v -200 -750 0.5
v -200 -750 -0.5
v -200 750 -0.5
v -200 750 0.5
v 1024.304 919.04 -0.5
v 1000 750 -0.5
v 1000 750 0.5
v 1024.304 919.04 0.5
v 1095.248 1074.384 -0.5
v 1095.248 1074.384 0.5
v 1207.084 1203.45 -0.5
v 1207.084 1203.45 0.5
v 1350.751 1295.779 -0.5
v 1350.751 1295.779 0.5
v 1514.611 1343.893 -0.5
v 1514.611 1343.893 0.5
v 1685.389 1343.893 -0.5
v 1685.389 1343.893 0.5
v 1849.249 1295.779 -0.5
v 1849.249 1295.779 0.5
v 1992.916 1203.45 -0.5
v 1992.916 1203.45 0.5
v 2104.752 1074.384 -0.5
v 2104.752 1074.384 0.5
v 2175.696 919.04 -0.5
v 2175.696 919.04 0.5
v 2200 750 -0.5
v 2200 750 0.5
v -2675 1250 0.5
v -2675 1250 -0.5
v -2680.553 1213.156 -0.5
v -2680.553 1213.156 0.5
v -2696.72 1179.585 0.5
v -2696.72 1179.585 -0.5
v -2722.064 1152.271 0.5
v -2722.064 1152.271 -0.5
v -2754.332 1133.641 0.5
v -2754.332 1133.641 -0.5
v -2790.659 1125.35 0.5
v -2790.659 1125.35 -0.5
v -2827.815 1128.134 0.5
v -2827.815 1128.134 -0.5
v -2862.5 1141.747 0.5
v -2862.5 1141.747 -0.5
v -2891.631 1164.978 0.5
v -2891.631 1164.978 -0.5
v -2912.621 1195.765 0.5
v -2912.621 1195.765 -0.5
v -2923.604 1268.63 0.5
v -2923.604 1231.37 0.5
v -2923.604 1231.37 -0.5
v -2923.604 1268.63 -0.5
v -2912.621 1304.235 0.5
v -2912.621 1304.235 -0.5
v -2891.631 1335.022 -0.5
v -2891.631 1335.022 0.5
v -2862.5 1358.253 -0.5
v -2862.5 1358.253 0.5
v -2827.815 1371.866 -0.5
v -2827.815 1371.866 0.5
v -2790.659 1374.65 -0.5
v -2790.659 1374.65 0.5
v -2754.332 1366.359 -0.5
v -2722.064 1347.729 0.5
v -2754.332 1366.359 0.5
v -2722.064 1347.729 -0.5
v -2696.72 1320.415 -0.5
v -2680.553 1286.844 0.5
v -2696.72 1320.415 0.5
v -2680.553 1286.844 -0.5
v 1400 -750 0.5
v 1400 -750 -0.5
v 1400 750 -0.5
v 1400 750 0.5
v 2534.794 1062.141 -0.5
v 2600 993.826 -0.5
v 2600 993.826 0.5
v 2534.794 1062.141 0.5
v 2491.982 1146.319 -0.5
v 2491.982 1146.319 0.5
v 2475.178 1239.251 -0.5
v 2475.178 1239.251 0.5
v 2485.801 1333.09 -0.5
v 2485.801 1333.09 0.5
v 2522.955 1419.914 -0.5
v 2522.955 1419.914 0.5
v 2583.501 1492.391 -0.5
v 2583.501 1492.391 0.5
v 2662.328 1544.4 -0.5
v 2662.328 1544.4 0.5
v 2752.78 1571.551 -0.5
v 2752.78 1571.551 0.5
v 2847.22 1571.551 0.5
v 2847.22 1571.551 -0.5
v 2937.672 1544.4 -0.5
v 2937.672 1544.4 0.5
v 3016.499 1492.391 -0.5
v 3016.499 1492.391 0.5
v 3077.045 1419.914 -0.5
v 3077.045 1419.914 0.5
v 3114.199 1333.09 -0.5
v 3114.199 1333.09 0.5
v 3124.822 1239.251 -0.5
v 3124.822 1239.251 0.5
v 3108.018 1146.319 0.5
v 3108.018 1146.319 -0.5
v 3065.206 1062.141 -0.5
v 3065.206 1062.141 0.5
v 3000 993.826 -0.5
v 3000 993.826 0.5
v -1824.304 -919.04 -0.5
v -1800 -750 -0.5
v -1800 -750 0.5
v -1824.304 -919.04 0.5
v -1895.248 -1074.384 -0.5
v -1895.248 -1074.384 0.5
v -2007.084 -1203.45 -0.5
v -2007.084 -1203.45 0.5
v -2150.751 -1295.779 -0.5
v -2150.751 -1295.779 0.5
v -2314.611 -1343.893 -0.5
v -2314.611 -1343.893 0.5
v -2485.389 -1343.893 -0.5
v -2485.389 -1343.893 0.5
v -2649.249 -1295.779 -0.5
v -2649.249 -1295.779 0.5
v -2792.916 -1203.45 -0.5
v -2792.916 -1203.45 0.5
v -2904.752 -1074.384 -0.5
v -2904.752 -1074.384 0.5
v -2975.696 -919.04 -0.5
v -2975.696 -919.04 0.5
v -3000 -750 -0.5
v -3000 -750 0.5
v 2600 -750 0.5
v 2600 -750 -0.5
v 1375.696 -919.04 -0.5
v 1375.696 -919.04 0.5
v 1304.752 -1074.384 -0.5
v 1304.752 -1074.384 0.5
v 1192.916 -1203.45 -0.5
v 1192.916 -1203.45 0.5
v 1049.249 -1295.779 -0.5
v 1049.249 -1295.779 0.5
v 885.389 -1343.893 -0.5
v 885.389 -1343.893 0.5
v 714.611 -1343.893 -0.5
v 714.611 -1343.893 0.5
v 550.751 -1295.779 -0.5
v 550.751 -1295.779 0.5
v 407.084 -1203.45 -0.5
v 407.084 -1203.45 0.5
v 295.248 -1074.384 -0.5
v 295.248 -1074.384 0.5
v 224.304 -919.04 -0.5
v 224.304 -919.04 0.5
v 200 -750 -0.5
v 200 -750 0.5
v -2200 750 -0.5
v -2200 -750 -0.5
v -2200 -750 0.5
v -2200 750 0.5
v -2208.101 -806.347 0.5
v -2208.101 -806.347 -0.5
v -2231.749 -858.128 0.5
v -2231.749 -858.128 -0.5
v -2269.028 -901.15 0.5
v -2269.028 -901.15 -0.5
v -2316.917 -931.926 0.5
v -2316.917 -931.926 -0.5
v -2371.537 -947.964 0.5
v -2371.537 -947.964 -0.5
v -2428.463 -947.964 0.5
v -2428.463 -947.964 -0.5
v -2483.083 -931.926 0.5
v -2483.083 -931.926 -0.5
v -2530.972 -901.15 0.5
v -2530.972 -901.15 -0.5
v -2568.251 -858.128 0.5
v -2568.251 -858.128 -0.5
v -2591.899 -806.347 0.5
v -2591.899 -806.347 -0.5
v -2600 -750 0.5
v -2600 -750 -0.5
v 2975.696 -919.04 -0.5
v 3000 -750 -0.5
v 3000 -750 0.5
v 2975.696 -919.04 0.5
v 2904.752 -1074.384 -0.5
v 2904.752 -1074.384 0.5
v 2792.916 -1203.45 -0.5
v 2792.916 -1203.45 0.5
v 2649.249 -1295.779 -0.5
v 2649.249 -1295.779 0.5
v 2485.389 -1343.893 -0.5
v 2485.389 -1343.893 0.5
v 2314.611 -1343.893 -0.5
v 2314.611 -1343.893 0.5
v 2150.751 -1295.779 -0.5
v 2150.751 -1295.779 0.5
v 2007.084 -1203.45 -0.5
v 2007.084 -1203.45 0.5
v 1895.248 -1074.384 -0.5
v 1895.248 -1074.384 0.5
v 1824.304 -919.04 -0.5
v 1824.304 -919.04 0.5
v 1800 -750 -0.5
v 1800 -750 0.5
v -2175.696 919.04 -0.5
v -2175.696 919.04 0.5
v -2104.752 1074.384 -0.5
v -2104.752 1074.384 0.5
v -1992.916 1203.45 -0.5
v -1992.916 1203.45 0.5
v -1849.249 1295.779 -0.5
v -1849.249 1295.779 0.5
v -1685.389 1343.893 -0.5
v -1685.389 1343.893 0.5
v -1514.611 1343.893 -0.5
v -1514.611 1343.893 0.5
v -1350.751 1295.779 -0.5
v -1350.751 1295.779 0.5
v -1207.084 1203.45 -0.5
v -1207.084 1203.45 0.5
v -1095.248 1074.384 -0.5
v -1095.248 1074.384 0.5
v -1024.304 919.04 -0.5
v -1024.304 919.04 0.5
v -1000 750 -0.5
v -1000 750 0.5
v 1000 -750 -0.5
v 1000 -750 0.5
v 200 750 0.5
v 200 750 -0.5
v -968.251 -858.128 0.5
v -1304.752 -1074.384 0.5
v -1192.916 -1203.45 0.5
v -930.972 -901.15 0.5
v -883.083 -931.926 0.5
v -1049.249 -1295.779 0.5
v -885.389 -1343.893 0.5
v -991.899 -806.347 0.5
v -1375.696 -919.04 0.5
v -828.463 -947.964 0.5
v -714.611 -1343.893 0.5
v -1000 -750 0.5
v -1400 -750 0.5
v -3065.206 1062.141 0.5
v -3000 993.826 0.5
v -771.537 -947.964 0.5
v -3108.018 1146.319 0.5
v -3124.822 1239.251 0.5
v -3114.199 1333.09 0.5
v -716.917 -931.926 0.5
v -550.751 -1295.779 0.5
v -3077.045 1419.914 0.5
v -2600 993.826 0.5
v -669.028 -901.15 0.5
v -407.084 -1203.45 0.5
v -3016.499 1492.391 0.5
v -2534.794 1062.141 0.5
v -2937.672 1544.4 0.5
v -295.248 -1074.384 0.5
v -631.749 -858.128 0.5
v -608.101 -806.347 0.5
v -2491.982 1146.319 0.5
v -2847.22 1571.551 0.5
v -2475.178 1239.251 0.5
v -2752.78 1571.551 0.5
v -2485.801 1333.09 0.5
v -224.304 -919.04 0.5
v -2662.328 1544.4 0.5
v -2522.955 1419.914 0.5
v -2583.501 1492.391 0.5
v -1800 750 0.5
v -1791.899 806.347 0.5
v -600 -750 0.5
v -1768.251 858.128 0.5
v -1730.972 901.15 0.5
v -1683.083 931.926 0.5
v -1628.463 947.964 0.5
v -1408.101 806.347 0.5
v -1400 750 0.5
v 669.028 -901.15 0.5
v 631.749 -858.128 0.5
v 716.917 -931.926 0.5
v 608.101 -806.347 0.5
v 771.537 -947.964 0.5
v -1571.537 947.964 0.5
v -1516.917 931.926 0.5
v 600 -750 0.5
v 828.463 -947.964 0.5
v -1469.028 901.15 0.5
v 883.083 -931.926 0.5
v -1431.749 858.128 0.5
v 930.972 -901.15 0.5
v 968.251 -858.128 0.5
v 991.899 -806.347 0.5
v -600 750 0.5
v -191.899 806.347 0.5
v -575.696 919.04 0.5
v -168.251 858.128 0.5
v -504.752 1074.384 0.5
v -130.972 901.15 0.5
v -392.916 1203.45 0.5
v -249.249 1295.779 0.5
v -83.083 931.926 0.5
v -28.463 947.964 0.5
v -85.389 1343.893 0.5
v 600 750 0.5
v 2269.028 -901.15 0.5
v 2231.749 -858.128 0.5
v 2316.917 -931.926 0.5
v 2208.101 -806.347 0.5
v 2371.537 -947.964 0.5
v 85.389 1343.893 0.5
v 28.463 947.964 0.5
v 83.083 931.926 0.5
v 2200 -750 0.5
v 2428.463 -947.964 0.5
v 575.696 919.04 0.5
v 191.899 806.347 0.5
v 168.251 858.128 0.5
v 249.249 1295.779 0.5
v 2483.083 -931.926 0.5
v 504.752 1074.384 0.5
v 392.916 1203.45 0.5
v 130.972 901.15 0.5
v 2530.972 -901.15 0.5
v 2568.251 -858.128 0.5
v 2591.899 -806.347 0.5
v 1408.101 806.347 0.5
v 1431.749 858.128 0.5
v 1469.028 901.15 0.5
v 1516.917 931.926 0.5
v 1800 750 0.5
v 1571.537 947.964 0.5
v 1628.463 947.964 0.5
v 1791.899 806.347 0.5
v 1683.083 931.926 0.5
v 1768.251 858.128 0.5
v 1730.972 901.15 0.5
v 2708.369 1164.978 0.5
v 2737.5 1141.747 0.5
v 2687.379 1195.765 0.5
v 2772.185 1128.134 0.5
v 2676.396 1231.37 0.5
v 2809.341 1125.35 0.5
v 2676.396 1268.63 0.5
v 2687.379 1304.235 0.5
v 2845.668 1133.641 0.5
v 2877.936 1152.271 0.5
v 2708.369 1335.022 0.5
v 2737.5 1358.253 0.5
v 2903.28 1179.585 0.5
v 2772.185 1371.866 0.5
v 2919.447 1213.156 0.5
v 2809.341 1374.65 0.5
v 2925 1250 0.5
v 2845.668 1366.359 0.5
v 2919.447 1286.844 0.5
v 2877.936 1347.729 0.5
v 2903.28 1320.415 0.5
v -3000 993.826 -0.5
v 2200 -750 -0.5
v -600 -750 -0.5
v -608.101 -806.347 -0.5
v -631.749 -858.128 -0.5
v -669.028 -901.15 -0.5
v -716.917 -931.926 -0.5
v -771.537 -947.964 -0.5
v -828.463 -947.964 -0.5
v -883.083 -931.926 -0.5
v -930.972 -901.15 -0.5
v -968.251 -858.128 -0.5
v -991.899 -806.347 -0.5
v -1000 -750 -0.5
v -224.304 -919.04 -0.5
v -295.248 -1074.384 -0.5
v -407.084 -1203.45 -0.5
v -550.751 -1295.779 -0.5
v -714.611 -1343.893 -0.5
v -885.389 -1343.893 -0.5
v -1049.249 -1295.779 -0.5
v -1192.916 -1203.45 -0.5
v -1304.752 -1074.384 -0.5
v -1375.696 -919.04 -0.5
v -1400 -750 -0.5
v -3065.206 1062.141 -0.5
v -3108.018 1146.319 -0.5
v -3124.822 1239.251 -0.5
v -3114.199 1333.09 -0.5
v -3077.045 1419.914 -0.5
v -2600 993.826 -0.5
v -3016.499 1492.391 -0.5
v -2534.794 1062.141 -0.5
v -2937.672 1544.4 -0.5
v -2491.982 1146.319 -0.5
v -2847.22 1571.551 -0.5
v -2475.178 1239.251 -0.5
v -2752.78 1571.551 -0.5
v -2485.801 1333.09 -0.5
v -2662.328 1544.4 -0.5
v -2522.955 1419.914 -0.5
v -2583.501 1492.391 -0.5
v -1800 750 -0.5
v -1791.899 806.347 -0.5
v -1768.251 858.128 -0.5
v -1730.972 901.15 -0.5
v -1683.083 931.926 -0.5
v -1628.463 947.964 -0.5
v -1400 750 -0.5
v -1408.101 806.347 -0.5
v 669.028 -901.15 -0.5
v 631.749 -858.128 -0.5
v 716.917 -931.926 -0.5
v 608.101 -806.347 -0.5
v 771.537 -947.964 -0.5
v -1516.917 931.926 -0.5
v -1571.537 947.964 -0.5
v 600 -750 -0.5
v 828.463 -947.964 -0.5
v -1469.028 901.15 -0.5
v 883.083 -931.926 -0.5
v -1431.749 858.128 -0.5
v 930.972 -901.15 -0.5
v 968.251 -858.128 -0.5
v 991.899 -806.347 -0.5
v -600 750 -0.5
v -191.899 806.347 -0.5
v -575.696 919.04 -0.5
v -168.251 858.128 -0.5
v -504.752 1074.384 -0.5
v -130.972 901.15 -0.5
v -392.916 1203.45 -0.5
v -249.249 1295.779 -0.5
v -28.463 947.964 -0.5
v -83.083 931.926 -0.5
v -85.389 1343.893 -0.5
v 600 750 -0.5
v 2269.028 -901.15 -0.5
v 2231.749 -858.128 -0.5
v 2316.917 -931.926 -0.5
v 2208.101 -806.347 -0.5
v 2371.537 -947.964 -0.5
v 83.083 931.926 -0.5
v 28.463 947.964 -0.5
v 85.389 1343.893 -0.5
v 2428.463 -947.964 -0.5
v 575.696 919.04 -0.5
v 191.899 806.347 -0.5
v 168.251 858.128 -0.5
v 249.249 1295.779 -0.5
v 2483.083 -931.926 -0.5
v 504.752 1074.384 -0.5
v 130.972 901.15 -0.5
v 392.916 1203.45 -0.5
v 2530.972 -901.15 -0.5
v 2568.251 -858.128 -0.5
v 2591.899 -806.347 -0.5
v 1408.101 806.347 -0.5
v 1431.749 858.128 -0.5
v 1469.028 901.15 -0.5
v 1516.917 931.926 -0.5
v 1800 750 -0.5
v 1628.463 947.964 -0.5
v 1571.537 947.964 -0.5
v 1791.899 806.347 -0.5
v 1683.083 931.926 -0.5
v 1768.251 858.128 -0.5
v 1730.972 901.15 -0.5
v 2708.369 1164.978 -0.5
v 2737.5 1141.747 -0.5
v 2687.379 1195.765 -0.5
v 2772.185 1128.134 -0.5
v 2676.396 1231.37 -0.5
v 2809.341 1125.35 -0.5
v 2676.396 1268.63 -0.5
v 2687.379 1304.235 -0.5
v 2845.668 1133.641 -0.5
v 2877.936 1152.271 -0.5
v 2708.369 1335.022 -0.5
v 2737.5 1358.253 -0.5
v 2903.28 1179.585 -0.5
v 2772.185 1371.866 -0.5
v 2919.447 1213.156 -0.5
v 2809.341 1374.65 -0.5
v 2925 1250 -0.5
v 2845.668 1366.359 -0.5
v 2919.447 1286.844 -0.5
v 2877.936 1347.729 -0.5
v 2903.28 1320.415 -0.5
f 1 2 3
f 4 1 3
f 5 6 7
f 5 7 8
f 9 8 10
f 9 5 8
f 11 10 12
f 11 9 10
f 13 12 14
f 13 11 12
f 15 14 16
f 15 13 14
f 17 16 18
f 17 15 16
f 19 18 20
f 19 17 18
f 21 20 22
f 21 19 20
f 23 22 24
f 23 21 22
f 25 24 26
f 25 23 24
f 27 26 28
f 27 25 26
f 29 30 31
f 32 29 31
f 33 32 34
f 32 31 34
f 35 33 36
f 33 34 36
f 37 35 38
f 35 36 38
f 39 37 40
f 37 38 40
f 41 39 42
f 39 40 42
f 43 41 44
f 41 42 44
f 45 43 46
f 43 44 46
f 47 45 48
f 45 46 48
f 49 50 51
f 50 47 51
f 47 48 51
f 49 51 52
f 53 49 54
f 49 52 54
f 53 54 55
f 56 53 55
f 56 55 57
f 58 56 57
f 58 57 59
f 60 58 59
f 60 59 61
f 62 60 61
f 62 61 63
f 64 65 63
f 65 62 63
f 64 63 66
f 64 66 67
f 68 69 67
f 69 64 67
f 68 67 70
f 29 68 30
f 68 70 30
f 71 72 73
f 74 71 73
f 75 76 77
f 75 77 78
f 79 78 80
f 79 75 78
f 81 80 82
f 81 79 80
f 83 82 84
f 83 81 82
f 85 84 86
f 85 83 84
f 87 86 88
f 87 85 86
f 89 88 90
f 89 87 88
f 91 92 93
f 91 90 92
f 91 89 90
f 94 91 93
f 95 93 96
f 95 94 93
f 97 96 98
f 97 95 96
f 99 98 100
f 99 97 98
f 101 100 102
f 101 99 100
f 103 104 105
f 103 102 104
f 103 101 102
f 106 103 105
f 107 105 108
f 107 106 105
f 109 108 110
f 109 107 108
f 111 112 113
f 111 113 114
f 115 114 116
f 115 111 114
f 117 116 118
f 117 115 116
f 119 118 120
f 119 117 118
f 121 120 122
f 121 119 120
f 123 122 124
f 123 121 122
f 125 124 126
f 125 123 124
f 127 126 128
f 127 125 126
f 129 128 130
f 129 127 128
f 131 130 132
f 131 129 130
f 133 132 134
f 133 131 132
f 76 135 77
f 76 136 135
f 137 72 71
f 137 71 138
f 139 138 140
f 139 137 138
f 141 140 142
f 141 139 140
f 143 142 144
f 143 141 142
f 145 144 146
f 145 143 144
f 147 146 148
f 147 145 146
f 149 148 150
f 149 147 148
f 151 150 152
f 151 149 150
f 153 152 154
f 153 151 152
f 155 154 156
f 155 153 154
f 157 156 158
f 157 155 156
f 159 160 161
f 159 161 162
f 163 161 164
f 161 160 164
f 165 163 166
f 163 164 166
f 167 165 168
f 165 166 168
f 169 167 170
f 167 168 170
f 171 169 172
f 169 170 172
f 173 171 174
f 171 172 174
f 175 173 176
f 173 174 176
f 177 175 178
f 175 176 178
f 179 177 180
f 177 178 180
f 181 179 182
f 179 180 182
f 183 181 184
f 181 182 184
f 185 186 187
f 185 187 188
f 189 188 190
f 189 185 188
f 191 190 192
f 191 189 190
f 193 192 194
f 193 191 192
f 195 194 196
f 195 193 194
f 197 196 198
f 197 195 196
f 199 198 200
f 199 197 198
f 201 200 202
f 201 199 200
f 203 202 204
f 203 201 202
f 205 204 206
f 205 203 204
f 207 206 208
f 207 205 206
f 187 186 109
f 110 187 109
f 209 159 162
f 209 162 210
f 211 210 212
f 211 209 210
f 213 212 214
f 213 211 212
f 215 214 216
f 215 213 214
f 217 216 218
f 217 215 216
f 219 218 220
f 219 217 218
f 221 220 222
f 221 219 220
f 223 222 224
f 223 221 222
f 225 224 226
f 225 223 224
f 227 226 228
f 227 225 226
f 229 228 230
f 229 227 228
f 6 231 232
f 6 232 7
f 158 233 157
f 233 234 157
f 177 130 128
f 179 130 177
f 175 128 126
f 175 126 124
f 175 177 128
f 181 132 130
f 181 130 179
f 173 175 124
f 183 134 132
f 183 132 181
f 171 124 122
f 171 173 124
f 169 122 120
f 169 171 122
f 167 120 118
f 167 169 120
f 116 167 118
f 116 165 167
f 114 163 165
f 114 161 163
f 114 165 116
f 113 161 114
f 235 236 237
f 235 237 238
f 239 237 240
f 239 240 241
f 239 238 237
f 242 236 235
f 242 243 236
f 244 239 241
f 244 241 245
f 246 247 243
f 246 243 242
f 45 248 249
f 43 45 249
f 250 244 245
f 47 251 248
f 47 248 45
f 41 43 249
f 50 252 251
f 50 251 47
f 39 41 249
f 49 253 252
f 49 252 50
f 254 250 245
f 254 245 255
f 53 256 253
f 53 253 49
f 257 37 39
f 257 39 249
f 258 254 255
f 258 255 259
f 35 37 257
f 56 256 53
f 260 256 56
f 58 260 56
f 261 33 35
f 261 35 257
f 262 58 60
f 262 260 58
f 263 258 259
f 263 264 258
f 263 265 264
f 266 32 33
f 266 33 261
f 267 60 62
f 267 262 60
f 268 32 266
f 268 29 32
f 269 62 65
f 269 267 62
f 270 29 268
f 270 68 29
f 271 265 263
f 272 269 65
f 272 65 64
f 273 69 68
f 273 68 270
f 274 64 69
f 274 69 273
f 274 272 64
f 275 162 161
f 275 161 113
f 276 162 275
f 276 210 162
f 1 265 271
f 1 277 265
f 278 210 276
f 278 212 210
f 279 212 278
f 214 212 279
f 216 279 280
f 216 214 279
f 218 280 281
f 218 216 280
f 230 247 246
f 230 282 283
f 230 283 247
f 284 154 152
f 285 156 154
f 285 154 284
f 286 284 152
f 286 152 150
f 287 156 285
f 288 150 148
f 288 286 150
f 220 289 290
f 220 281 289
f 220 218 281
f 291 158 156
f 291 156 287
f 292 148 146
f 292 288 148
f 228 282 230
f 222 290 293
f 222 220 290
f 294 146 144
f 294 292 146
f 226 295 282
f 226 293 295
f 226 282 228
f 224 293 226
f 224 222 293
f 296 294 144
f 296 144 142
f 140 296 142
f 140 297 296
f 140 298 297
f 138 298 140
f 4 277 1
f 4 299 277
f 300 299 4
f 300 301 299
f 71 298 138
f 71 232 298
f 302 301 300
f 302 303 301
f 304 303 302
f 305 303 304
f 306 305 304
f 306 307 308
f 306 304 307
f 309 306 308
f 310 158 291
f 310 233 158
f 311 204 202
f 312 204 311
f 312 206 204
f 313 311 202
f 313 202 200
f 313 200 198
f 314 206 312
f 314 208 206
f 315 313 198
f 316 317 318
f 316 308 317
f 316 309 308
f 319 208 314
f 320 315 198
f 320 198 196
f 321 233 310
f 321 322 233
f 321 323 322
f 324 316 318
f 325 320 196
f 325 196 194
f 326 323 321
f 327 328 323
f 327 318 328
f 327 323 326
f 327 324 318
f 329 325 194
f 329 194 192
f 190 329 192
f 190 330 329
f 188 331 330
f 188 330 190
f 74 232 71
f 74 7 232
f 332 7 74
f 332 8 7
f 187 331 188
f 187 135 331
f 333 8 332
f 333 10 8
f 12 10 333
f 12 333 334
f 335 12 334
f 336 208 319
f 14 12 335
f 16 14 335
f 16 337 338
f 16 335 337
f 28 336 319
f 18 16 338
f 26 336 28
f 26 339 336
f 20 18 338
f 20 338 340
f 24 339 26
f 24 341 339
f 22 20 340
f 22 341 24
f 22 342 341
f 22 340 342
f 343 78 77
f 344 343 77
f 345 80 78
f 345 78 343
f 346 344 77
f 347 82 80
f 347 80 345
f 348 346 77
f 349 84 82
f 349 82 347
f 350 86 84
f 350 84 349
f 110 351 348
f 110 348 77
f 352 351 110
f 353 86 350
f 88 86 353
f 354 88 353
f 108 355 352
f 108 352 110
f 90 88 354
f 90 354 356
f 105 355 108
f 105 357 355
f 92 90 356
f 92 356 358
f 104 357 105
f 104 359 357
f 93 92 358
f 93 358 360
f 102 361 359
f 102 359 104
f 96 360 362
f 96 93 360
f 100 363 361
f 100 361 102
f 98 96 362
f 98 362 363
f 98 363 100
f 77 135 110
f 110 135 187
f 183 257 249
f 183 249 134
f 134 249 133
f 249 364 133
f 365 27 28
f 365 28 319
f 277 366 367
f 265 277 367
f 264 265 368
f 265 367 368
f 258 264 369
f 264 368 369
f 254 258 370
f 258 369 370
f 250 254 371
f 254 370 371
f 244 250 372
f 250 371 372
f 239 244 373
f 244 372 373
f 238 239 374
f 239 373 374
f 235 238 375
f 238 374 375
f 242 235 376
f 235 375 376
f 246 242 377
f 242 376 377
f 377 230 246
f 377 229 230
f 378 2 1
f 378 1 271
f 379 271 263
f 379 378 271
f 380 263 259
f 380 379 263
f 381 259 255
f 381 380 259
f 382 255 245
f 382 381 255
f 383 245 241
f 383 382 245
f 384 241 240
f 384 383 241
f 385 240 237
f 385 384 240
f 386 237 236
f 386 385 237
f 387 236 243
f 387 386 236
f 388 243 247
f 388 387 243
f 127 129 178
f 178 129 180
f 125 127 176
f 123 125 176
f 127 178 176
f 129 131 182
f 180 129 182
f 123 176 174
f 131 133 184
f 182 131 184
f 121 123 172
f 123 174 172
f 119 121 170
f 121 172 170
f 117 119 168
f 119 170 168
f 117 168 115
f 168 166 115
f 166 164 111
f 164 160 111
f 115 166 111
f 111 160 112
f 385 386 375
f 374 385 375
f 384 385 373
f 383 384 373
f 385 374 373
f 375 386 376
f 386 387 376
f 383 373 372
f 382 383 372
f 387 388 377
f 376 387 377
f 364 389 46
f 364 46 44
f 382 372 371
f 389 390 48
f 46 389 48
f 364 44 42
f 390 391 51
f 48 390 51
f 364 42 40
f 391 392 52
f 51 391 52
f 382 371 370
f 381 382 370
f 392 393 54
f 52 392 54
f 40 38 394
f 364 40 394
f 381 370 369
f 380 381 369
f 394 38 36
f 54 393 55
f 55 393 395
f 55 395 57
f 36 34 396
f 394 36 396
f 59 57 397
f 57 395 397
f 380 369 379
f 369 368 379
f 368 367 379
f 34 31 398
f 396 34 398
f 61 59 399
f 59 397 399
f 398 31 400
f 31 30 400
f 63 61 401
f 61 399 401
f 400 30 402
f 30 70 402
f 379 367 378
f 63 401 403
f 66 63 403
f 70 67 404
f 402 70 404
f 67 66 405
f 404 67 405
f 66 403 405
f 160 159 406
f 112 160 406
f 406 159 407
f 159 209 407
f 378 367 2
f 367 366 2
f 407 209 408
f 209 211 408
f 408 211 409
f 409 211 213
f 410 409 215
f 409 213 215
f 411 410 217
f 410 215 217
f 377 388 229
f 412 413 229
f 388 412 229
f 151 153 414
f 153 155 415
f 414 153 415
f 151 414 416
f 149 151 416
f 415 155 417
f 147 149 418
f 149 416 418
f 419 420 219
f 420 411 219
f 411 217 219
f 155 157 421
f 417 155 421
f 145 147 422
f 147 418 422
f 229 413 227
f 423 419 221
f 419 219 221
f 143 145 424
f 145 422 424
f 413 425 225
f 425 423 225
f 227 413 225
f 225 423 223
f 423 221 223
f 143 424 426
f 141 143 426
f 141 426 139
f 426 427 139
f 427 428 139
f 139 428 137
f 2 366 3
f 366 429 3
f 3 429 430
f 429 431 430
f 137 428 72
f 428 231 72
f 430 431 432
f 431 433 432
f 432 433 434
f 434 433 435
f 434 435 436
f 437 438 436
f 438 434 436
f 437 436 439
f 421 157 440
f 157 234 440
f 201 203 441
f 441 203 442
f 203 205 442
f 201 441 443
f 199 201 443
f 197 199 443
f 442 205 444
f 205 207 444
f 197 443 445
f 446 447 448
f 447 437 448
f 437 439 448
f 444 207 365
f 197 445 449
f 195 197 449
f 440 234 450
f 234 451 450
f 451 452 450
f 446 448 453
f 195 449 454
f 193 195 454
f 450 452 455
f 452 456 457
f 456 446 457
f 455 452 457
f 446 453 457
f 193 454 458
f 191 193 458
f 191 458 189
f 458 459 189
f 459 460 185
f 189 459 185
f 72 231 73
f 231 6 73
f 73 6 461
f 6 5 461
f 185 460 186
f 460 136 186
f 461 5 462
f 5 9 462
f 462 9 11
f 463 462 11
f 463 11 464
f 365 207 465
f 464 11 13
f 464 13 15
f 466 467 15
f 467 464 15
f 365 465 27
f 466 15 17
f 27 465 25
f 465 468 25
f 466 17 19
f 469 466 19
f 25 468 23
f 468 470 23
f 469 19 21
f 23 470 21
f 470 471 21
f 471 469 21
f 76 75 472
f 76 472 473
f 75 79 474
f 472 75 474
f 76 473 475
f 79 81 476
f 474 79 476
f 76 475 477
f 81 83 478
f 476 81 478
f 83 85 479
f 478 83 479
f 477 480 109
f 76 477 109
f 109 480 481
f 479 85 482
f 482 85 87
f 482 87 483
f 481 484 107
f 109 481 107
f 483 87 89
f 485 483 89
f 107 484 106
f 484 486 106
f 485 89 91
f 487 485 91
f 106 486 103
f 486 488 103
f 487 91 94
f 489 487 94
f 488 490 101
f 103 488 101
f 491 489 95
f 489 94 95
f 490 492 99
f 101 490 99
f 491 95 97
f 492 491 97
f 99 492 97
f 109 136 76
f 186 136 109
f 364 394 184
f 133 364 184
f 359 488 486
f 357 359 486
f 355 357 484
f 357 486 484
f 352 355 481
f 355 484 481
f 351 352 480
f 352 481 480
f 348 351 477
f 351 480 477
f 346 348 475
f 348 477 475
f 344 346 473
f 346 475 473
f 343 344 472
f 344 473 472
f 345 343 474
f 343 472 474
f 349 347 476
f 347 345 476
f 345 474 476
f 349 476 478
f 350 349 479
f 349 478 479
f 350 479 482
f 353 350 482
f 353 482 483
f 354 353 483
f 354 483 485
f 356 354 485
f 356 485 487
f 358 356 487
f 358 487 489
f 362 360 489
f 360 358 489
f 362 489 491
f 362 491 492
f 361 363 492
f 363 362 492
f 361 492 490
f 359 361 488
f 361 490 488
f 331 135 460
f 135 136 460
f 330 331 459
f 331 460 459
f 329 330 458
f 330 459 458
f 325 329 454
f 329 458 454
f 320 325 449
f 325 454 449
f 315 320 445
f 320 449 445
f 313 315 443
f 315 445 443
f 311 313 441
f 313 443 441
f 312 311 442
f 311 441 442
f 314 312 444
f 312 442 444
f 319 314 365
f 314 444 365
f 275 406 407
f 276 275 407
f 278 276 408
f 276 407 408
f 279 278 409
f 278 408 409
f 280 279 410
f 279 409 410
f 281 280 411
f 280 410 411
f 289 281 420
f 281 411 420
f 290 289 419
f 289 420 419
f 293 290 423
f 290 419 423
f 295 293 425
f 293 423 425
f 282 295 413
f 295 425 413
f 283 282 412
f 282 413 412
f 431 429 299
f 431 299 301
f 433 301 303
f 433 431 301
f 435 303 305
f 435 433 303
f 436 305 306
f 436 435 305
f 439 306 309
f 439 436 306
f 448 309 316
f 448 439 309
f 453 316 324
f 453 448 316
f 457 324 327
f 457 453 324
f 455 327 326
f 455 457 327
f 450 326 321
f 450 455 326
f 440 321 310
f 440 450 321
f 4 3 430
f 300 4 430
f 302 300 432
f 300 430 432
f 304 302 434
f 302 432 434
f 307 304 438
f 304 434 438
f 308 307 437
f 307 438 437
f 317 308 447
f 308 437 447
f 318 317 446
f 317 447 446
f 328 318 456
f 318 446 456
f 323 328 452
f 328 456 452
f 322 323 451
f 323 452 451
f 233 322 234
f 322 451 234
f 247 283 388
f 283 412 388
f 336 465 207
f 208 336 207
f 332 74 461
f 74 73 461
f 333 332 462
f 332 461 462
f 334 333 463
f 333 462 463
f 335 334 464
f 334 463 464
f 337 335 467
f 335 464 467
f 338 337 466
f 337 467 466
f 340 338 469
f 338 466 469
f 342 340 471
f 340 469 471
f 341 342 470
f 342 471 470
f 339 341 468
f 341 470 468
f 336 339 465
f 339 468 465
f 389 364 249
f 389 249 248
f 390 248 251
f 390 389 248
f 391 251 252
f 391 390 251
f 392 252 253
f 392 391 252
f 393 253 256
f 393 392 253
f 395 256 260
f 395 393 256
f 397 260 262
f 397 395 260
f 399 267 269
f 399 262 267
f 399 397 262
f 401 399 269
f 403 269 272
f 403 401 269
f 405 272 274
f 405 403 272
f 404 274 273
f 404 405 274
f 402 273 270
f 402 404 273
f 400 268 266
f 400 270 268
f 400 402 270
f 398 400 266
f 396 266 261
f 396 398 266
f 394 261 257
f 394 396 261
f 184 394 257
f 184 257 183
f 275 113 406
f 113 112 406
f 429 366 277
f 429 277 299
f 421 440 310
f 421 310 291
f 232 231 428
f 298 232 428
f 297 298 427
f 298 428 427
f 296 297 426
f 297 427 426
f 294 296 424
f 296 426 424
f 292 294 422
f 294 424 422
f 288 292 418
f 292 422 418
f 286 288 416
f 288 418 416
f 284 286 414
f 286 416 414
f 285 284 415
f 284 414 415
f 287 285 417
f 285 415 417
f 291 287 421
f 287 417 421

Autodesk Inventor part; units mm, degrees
ref_plane "YZ Plane" through (0, 0, 0) normal (1, 0, 0) x (0, 1, 0)
ref_plane "XZ Plane" through (0, 0, 0) normal (0, 1, 0) x (-1, 0, 0)
ref_plane "XY Plane" through (0, 0, 0) normal (0, 0, 1) x (1, 0, 0)
sketch "Sketch1" plane through (0, 0, 0) normal (0, 0, 1) x (1, 0, 0)
  circle A0 centre (-2800, 1250) radius 325 construction
  line L0 (-2800, 1250) -> (-2800, -750) construction
  line L1 (-3000, 993.8262) -> (-3000, -750)
  line L2 (-2600, 993.8262) -> (-2600, -750)
  circle A1 centre (-2400, -750) radius 200 construction
  arc A2 (-2600, -750) -> (-2200, -750) centre (-2400, -750) ccw
  circle A3 centre (-2400, -750) radius 600 construction
  arc A4 (-3000, -750) -> (-1800, -750) centre (-2400, -750) ccw
  line L3 (-2200, -750) -> (-2200, 750)
  line L4 (-1800, -750) -> (-1800, 750)
  circle A5 centre (-1600, 750) radius 200 construction
  arc A6 (-1400, 750) -> (-1800, 750) centre (-1600, 750) ccw
  circle A7 centre (-1600, 750) radius 600 construction
  arc A8 (-1000, 750) -> (-2200, 750) centre (-1600, 750) ccw
  line L5 (-1400, 750) -> (-1400, -750)
  line L6 (-1000, 750) -> (-1000, -750)
  circle A9 centre (-800, -750) radius 200 construction
  arc A10 (-1000, -750) -> (-600, -750) centre (-800, -750) ccw
  circle A11 centre (-800, -750) radius 600 construction
  arc A12 (-1400, -750) -> (-200, -750) centre (-800, -750) ccw
  line L7 (-600, -750) -> (-600, 750)
  line L8 (-200, -750) -> (-200, 750)
  arc A13 (600, 750) -> (-600, 750) centre (0, 750) ccw
  arc A14 (200, 750) -> (-200, 750) centre (0, 750) ccw
  line L9 (200, 750) -> (200, -750)
  line L10 (600, 750) -> (600, -750)
  arc A15 (200, -750) -> (1400, -750) centre (800, -750) ccw
  arc A16 (600, -750) -> (1000, -750) centre (800, -750) ccw
  line L11 (1000, -750) -> (1000, 750)
  line L12 (1400, -750) -> (1400, 750)
  arc A17 (2200, 750) -> (1000, 750) centre (1600, 750) ccw
  arc A18 (1800, 750) -> (1400, 750) centre (1600, 750) ccw
  line L13 (1800, 750) -> (1800, -750)
  line L14 (2200, 750) -> (2200, -750)
  arc A19 (1800, -750) -> (3000, -750) centre (2400, -750) ccw
  arc A20 (2200, -750) -> (2600, -750) centre (2400, -750) ccw
  line L15 (2600, -750) -> (2600, 993.8262)
  line L16 (3000, -750) -> (3000, 993.8262)
  circle A21 centre (2800, 1250) radius 325 construction
  arc A22 (-2600, 993.8262) -> (-3000, 993.8262) centre (-2800, 1250) ccw
  arc A23 (3000, 993.8262) -> (2600, 993.8262) centre (2800, 1250) ccw
  circle A24 centre (2800, 1250) radius 125
  circle A25 centre (-2800, 1250) radius 125
  line L17 (-2800, 1250) -> (2800, 1250) construction
  line L18 (-1600, 750) -> (-2400, -750) construction
  point P0 (0, 0)
  point P1 (0, 1250)
  point P2 (-2000, 0)
  dimension "d24" = 400
  dimension "d21" = 200
  dimension "d23" = 2000
  dimension "d25" = 1500
  dimension "d32" = 250
  dimension "d33" = 200
extrude "Extrusion1" add sketch "Sketch1" along normal mid plane 1
equation "\"d24\" = 2 * d21"
equation "\"d33\" = d21"
properties part number "sensor-0002-001"
